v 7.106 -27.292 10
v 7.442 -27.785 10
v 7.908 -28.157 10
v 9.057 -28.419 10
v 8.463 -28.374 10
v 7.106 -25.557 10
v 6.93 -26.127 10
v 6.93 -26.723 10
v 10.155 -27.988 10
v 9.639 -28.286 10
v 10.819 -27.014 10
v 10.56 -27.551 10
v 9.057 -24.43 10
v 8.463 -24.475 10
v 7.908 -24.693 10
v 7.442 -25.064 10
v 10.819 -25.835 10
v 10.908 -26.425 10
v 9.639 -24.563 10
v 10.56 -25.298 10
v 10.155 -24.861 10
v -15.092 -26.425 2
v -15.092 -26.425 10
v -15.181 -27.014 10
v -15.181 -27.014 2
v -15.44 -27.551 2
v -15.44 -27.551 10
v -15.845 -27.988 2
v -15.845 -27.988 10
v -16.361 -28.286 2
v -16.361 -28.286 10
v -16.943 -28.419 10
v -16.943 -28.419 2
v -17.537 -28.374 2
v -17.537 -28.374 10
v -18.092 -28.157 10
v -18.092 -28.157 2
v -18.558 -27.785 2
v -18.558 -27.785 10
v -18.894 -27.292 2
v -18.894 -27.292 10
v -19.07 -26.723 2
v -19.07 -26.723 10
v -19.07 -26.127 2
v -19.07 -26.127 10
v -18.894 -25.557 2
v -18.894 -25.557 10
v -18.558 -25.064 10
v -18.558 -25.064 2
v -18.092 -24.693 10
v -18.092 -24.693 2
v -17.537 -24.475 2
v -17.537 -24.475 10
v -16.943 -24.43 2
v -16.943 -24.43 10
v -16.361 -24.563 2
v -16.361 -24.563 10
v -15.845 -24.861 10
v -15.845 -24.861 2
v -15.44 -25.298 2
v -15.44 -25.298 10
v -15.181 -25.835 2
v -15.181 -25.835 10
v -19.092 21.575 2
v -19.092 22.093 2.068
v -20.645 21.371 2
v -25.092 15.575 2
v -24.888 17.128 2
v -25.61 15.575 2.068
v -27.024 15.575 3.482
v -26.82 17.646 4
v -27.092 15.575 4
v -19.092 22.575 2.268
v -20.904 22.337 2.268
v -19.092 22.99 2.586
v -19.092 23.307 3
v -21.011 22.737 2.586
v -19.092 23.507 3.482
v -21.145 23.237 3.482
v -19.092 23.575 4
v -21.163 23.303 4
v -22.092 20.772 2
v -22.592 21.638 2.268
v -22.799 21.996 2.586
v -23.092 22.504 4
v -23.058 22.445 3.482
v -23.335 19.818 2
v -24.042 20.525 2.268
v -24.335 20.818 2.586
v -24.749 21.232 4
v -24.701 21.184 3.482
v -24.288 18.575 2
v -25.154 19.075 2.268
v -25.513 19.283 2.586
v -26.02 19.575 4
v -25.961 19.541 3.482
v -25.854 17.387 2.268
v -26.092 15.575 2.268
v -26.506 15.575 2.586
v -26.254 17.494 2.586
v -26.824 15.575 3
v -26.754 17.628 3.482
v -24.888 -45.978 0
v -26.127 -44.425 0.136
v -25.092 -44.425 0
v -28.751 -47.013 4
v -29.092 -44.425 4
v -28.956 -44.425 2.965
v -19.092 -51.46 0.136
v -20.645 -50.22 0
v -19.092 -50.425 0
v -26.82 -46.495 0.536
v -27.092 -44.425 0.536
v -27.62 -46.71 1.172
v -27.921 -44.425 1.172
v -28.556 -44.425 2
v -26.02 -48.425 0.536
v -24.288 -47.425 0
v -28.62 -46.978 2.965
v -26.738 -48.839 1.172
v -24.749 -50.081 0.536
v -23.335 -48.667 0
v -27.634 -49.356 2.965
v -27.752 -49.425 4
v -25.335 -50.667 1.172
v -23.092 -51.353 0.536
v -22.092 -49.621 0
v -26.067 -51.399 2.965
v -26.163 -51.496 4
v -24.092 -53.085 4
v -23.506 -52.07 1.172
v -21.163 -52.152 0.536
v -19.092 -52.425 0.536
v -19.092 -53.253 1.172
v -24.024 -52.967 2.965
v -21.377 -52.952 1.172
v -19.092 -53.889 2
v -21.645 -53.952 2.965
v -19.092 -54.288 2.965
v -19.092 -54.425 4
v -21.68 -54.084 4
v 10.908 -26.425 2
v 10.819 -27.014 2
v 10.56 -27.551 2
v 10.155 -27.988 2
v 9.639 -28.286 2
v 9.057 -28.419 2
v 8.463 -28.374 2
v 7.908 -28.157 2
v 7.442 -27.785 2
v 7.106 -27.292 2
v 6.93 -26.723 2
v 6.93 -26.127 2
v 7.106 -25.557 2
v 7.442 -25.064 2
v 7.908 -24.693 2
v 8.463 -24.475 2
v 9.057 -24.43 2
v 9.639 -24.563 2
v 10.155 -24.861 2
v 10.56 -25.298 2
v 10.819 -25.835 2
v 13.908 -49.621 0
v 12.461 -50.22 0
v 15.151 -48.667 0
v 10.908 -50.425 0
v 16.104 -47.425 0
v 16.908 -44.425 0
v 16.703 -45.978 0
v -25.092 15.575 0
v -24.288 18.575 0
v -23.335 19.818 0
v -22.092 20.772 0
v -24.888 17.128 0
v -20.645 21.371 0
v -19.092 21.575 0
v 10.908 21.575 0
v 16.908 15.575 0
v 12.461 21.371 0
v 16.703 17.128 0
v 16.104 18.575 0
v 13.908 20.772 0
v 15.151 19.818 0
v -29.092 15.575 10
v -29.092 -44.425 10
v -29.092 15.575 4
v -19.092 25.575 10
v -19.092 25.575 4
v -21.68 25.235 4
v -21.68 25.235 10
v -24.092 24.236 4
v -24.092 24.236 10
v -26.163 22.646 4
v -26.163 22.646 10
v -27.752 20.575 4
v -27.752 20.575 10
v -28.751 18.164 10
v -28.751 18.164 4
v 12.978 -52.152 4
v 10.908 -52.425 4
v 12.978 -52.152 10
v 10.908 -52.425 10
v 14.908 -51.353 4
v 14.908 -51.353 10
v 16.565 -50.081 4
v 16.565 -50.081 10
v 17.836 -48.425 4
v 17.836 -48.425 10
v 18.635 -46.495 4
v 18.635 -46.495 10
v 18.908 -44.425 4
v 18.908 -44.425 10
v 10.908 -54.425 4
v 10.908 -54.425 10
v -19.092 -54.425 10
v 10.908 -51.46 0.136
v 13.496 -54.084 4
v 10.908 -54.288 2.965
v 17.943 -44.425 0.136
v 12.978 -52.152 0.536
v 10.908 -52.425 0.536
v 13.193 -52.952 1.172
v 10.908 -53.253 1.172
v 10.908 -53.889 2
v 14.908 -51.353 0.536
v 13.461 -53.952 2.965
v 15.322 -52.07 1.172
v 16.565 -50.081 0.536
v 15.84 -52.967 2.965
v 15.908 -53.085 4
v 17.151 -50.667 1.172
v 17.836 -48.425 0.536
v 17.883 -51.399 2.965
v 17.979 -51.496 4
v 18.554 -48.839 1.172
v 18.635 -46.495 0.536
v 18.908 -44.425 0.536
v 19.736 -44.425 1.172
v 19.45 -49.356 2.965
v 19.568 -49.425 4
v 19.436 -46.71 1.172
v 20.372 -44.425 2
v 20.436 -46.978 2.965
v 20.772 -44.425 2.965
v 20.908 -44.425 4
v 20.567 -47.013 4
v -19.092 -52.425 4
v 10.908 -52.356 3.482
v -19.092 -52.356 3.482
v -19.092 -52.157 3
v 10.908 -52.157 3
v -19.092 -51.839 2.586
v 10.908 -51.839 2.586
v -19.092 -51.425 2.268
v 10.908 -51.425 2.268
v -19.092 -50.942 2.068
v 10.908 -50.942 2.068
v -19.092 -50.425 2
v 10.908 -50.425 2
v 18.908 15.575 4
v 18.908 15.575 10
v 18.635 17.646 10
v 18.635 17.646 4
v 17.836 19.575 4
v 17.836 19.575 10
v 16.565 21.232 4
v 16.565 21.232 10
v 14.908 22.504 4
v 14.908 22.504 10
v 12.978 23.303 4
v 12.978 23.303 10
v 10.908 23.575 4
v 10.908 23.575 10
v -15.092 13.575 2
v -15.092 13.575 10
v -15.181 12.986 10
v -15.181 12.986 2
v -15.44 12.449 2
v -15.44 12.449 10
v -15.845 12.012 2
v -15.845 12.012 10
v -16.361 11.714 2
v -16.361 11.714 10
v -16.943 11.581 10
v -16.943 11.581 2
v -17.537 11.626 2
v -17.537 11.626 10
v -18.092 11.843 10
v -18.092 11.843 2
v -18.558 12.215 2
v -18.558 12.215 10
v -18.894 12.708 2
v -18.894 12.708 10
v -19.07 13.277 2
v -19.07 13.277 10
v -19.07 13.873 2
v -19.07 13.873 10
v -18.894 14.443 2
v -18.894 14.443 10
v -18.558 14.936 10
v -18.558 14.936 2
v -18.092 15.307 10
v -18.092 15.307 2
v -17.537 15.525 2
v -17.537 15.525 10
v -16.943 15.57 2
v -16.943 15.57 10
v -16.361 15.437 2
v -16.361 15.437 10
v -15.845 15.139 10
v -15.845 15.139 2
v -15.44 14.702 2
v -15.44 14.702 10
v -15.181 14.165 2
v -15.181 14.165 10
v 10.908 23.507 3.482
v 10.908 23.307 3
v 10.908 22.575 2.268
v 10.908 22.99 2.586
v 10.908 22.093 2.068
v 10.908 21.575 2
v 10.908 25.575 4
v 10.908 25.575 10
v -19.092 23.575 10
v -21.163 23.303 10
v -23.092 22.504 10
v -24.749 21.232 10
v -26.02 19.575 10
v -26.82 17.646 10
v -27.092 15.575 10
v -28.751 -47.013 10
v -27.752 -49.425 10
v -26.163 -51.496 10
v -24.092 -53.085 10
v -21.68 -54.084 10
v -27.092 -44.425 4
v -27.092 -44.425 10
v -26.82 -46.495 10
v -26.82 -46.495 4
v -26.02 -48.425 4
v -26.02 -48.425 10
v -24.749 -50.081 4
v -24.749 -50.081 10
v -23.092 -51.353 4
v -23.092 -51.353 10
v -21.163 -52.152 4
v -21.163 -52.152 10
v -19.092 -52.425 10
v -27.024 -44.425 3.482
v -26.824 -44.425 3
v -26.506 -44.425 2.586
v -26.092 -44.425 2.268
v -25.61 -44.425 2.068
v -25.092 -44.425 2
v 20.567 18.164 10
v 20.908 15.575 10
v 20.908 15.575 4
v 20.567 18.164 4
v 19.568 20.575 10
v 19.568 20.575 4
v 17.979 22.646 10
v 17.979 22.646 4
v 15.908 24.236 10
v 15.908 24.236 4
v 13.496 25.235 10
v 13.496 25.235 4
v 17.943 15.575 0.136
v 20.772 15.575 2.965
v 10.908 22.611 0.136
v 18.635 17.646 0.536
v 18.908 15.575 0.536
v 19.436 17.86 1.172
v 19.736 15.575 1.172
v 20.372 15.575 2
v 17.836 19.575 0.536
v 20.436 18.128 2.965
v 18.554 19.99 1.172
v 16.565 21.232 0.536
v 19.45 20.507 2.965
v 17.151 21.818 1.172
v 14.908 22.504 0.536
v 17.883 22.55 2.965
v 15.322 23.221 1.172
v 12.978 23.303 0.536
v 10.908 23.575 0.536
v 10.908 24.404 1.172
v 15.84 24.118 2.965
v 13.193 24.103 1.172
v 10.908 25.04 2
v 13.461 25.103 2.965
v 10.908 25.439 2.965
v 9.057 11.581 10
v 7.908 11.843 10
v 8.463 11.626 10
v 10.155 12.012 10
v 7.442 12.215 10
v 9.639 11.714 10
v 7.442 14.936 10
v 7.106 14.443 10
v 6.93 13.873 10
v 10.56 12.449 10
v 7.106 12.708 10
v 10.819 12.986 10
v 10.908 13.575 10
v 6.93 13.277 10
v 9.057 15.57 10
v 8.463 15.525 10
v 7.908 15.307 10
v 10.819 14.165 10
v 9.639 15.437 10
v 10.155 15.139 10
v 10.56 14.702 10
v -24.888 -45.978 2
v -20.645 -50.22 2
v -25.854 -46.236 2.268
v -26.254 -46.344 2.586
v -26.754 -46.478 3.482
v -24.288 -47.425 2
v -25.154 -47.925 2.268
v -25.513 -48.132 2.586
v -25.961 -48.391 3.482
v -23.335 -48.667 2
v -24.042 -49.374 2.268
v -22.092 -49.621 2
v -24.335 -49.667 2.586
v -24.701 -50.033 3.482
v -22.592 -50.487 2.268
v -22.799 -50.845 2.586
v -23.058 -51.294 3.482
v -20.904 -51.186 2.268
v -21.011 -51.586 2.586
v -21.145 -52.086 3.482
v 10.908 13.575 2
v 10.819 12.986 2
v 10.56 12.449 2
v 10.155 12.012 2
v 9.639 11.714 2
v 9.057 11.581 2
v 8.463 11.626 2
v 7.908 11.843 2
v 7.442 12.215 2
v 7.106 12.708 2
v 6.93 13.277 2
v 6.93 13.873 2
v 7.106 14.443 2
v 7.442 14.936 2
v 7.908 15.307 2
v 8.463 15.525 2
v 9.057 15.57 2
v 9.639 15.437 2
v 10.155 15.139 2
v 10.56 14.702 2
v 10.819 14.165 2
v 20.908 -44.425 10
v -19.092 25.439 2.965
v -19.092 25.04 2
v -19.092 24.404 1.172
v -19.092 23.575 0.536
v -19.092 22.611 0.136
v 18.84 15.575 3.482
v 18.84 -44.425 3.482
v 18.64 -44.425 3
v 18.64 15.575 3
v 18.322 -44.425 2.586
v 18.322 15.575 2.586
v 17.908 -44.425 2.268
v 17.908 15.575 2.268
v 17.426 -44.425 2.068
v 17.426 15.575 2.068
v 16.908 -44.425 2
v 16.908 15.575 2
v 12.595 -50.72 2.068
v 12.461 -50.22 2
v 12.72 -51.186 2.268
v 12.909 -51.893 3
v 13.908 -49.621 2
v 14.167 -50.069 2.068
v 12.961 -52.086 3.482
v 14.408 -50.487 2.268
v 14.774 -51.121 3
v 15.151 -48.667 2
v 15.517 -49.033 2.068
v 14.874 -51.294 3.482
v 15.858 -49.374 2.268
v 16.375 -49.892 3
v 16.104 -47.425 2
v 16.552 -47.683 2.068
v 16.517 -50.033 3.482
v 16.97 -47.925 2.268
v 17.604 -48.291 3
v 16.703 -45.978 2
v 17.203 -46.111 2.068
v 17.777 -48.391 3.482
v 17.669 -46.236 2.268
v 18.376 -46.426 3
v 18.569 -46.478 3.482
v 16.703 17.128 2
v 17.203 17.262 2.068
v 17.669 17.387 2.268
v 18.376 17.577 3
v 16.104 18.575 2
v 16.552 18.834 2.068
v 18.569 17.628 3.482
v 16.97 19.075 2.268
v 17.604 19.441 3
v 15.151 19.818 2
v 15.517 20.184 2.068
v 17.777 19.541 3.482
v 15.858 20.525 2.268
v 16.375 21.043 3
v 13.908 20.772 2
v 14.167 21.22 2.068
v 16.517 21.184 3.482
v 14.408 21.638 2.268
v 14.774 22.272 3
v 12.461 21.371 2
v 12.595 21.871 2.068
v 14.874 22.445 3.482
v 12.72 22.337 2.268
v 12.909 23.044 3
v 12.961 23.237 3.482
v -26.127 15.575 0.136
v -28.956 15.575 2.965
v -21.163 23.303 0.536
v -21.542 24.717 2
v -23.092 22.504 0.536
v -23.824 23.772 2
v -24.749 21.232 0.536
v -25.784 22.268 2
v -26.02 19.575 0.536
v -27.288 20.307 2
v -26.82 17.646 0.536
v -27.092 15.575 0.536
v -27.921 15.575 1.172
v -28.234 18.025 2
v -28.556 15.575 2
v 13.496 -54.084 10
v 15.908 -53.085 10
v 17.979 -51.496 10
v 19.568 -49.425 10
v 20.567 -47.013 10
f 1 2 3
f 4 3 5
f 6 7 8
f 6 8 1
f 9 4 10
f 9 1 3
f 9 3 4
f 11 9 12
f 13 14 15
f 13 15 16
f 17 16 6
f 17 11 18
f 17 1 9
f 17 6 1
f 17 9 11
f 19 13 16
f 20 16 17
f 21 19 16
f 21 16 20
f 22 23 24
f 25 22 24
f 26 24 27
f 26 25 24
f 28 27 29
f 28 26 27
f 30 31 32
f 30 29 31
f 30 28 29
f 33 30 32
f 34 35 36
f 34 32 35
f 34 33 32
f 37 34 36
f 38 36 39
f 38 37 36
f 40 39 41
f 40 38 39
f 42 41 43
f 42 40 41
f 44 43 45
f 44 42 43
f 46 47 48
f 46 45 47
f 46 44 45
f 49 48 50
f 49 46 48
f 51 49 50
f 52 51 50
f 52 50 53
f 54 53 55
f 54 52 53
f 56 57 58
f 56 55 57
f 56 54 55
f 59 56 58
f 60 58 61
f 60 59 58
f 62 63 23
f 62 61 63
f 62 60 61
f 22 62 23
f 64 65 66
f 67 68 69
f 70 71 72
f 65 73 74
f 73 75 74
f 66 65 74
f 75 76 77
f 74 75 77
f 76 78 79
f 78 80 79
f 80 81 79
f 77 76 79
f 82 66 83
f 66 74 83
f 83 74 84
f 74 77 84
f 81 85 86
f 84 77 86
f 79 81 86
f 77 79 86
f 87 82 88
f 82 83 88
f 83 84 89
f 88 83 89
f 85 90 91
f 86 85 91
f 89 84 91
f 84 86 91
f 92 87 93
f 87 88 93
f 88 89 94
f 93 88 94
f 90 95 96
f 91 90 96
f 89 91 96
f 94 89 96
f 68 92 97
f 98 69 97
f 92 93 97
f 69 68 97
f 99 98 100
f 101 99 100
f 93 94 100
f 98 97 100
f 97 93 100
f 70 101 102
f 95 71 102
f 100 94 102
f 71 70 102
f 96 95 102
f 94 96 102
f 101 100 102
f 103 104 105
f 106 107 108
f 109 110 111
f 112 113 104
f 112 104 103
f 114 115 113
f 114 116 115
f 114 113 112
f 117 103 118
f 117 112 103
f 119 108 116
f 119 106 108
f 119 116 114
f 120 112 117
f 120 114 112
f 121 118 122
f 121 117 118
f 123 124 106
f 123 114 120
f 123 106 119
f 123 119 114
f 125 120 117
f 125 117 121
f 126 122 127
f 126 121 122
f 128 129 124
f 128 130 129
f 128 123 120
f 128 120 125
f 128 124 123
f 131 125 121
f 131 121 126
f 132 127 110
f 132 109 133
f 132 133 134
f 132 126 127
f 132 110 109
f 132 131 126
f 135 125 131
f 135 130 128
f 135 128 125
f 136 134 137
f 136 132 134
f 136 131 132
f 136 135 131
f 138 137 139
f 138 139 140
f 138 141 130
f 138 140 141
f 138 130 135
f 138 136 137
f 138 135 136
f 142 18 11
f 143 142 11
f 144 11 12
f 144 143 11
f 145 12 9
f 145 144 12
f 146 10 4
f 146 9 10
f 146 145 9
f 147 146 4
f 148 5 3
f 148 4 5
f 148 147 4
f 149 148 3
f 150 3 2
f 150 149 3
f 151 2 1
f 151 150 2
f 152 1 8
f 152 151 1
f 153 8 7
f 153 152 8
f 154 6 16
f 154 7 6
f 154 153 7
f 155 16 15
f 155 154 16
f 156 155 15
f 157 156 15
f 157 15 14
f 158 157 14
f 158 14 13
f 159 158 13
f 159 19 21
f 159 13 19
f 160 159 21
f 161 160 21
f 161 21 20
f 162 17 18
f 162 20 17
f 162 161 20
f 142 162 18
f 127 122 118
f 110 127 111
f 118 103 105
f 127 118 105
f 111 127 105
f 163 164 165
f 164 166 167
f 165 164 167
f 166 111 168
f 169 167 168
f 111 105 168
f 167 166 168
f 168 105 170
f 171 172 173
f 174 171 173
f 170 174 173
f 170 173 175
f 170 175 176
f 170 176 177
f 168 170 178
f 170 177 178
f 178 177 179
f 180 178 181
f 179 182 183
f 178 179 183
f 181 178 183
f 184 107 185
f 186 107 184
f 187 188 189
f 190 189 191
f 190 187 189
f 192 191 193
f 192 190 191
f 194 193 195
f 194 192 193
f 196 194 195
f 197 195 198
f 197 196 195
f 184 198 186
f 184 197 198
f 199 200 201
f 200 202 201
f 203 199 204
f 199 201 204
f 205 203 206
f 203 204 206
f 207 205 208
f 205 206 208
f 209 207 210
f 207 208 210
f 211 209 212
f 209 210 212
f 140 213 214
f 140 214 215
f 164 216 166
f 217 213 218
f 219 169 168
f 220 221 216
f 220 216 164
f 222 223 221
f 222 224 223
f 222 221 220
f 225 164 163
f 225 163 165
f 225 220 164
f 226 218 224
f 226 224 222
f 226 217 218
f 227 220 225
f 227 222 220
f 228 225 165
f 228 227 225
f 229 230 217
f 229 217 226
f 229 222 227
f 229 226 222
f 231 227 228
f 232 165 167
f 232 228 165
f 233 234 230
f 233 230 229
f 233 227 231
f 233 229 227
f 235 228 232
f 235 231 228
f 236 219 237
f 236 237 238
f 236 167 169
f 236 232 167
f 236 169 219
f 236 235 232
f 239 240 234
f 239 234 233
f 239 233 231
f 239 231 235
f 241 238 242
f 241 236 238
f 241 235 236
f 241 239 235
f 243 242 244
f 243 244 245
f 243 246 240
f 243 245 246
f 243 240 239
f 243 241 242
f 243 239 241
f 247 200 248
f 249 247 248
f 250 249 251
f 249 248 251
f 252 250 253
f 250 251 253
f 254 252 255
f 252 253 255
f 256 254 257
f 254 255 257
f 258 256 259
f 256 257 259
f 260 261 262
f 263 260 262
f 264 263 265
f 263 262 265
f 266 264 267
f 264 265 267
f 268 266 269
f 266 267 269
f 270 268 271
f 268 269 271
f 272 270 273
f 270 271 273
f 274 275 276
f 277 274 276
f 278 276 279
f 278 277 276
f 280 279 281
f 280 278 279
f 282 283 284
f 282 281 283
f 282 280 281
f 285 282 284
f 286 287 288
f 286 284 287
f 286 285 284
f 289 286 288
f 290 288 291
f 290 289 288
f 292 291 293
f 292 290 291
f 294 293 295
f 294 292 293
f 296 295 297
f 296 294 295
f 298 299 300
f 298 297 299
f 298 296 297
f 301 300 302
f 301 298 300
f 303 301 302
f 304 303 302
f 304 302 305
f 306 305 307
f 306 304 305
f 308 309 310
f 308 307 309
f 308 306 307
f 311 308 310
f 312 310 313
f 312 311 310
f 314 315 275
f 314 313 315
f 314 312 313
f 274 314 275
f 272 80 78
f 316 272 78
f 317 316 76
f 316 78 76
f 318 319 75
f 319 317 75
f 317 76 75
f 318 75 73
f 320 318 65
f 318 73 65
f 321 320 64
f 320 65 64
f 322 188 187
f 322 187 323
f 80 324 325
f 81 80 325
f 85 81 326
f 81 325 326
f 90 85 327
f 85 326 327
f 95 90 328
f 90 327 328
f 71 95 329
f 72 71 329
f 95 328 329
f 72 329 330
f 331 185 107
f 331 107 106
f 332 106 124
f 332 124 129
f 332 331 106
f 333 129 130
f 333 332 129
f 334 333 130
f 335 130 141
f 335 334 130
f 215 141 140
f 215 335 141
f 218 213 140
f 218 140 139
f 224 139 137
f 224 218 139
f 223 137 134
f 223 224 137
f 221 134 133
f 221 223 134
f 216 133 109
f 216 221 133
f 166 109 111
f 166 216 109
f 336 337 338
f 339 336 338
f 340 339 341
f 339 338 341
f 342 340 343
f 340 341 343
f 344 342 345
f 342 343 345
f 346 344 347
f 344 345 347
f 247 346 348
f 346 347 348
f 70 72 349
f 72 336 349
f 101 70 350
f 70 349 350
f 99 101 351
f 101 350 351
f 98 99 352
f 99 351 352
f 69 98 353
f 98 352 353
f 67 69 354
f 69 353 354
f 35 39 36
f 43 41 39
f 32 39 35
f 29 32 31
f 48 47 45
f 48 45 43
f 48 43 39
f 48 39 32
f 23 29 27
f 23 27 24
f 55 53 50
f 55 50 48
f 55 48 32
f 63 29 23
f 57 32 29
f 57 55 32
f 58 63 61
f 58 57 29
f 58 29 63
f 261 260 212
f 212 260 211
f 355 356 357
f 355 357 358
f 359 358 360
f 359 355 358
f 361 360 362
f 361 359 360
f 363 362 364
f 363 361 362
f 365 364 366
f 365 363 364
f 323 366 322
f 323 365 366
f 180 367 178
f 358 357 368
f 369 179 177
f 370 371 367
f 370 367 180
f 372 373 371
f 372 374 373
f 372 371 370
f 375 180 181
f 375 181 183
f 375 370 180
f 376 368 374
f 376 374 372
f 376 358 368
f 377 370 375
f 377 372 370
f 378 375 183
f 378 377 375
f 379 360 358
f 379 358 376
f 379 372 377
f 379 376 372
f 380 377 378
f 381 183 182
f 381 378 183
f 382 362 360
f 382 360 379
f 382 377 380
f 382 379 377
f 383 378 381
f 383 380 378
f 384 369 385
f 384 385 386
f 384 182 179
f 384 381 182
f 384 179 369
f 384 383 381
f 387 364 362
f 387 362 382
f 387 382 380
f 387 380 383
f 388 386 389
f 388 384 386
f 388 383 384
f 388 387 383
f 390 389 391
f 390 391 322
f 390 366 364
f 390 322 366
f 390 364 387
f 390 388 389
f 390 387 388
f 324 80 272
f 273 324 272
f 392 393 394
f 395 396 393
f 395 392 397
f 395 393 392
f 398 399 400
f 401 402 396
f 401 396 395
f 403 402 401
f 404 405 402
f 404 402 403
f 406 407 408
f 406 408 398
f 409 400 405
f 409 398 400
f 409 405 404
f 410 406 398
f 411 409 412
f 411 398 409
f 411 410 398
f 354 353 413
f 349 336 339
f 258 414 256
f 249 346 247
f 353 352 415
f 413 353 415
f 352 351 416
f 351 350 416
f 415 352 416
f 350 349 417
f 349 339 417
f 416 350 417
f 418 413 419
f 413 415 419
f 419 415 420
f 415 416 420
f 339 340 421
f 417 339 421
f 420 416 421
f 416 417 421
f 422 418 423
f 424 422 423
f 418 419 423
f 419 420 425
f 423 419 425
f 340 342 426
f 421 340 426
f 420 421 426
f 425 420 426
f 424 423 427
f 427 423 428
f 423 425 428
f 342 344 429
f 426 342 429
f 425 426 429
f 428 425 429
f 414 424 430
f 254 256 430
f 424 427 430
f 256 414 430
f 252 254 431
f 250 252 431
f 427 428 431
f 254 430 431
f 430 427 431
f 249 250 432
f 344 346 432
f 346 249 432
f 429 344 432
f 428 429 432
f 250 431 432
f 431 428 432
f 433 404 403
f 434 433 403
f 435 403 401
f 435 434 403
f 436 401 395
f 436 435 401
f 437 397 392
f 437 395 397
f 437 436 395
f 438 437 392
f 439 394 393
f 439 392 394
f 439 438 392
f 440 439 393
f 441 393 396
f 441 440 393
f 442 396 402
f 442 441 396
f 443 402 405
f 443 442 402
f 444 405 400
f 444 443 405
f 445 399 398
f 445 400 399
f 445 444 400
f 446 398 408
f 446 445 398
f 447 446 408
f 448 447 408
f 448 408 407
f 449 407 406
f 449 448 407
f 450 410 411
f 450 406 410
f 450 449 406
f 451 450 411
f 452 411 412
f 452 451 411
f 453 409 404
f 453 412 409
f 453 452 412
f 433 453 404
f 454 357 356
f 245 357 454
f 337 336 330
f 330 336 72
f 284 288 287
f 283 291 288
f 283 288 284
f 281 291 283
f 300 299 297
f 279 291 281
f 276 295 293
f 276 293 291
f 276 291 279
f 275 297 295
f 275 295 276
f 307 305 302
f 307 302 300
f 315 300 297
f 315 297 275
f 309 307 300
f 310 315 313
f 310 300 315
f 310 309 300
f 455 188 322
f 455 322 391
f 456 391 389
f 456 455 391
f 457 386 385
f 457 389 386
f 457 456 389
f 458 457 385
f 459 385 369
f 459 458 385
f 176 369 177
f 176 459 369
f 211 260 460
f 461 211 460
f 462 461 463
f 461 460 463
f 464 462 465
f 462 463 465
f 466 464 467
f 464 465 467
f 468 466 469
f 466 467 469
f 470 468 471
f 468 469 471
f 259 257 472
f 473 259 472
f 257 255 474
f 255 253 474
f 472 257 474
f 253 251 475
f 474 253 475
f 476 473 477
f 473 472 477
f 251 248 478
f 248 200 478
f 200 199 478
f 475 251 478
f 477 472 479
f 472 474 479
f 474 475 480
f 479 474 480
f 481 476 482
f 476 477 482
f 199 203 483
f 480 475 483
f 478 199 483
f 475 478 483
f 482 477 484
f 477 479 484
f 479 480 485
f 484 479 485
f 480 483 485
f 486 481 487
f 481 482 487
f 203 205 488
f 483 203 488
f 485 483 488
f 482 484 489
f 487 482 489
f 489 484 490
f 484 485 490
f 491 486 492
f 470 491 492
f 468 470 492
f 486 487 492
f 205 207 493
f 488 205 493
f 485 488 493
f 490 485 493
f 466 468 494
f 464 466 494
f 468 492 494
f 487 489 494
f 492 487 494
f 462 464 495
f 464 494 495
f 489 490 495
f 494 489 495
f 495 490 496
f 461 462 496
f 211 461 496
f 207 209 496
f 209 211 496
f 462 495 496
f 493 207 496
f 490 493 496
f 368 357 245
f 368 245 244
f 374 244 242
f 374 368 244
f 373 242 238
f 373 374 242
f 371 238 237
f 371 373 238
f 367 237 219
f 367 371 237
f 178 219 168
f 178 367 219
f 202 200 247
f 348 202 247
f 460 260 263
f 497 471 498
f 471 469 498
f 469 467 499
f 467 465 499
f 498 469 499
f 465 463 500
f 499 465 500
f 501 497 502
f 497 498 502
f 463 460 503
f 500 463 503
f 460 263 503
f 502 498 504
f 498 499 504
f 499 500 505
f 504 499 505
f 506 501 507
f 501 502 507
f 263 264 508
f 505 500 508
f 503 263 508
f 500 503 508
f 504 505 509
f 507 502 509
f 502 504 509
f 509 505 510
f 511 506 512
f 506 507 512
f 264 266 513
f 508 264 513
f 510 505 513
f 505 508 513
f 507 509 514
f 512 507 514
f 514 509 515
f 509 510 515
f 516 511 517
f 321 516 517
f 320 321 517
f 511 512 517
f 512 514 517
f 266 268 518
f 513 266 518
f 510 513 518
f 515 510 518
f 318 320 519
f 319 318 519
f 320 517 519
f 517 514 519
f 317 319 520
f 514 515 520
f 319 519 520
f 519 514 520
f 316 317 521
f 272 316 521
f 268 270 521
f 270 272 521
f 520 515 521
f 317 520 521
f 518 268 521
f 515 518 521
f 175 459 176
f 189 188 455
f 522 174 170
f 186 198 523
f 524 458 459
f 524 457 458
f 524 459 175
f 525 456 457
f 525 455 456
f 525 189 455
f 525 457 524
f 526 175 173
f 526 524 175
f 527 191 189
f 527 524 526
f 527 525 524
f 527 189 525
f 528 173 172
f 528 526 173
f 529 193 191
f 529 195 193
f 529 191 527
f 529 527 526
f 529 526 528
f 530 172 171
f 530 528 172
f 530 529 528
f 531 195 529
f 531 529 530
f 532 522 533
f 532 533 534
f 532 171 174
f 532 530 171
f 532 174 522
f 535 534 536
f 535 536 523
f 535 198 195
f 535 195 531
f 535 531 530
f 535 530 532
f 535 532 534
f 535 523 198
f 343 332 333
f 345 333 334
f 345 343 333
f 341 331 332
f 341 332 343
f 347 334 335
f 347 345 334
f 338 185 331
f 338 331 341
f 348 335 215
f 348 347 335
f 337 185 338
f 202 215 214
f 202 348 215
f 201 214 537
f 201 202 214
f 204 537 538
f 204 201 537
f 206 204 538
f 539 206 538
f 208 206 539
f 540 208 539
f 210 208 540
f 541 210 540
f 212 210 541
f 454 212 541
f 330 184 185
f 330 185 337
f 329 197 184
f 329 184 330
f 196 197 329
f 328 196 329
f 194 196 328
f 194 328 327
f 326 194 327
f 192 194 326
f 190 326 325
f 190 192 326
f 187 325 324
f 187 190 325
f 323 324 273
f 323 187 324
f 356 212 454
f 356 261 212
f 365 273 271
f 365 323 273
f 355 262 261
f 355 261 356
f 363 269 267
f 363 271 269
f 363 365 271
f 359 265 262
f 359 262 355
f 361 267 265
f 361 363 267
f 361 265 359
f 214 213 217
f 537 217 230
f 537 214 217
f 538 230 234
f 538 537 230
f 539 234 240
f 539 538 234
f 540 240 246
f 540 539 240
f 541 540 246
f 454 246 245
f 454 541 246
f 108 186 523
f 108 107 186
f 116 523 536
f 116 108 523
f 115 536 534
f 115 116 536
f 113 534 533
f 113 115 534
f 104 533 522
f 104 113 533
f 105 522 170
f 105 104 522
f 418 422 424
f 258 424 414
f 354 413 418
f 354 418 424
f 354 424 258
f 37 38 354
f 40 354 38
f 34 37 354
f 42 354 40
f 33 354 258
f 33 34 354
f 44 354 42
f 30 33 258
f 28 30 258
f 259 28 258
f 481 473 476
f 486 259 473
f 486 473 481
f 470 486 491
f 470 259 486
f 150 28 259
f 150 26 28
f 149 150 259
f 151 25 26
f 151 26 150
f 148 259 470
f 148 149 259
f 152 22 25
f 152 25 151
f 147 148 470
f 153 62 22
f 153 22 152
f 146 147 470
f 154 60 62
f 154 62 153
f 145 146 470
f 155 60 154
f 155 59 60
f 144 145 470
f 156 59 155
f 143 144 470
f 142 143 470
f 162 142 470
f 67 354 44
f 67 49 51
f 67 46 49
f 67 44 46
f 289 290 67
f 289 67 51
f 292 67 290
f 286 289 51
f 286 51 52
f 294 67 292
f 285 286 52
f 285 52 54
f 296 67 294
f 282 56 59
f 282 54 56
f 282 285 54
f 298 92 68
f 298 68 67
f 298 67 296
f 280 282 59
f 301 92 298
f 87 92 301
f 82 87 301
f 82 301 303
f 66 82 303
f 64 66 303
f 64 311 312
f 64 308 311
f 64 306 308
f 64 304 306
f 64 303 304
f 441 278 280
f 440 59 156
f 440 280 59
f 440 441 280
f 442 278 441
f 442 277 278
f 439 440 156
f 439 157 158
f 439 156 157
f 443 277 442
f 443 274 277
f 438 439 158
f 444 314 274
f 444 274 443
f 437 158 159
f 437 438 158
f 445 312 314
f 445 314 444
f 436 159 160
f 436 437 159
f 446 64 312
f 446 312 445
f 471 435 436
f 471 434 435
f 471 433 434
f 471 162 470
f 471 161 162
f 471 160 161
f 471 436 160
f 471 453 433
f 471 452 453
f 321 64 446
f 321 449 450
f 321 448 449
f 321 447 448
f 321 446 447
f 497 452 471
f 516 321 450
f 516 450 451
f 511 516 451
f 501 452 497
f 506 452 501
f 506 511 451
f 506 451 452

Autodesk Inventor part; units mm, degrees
ref_plane "YZ Plane" through (0, 0, 0) normal (1, 0, 0) x (0, 1, 0)
ref_plane "XZ Plane" through (0, 0, 0) normal (0, 1, 0) x (-1, 0, 0)
ref_plane "XY Plane" through (0, 0, 0) normal (0, 0, 1) x (1, 0, 0)
sketch "Esboço1" plane through (0, 0, 0) normal (0, 0, 1) x (1, 0, 0)
  line L0 (-29.0921, 25.5754) -> (20.9079, 25.5754)
  line L1 (20.9079, 25.5754) -> (20.9079, -54.4246)
  line L2 (20.9079, -54.4246) -> (-29.0921, -54.4246)
  line L3 (-29.0921, -54.4246) -> (-29.0921, 25.5754)
  point P0 (0, 0)
extrude "Extrusão1" add sketch "Esboço1" along normal blind 10
fillet "Arredondamento1" radius 10 4 edges at (-29.0921, 25.5754, 5) (20.9079, 25.5754, 5) (20.9079, -54.4246, 5) (-29.0921, -54.4246, 5)
fillet "Arredondamento2" radius 4 8 edges at (-26.1631, 22.6465, 0) (-29.0921, -14.4246, 0) (-26.1631, -51.4956, 0) (-4.0921, -54.4246, 0) (17.979, -51.4956, 0) (20.9079, -14.4246, 0) (17.979, 22.6465, 0) (-4.0921, 25.5754, 0)
shell "Casca1" thickness 2 removed faces 1 at (-12.4254, -4.4246, 10)
sketch "Esboço2" plane through (-19.0921, -50.4246, 2) normal (0, 0, 1) x (1, 0, 0)
  arc A0 (-8, 6) -> (0, -2) centre (0, 6) ccw projected
  line L0 (-8, 6) -> (-8, 66) projected
  arc A1 (0, 74) -> (-8, 66) centre (0, 66) ccw projected
  line L1 (0, 74) -> (30, 74) projected
  arc A2 (38, 66) -> (30, 74) centre (30, 66) ccw projected
  line L2 (38, 66) -> (38, 6) projected
  arc A3 (30, -2) -> (38, 6) centre (30, 6) ccw projected
  line L3 (30, -2) -> (0, -2) projected
  arc A4 (-10, 6) -> (0, -4) centre (0, 6) ccw projected
  line L4 (0, -4) -> (30, -4) projected
  arc A5 (30, -4) -> (40, 6) centre (30, 6) ccw projected
  line L5 (40, 6) -> (40, 66) projected
  arc A6 (40, 66) -> (30, 76) centre (30, 66) ccw projected
  line L6 (30, 76) -> (0, 76) projected
  arc A7 (0, 76) -> (-10, 66) centre (0, 66) ccw projected
  line L7 (-10, 66) -> (-10, 6) projected
  arc A8 (0, 72) -> (-6, 66) centre (0, 66) ccw projected
  circle A9 centre (2, 64) radius 2
  circle A10 centre (28, 64) radius 2
  circle A11 centre (2, 24) radius 2
  circle A12 centre (28, 24) radius 2
  point P0 (19.0921, 50.4246)
  dimension "d16" = 8
  dimension "d17" = 8
  dimension "d18" = 36
  dimension "d19" = 36
  dimension "d20" = 12
  dimension "d21" = 12
extrude "Extrusão2" add sketch "Esboço2" along normal up to surface (8 mm away) contours A9 | A10 | A11 | A12
equation "\"d17\" = d16"
equation "\"d19\" = d18"
properties part number "Carcaca-Baixa"
